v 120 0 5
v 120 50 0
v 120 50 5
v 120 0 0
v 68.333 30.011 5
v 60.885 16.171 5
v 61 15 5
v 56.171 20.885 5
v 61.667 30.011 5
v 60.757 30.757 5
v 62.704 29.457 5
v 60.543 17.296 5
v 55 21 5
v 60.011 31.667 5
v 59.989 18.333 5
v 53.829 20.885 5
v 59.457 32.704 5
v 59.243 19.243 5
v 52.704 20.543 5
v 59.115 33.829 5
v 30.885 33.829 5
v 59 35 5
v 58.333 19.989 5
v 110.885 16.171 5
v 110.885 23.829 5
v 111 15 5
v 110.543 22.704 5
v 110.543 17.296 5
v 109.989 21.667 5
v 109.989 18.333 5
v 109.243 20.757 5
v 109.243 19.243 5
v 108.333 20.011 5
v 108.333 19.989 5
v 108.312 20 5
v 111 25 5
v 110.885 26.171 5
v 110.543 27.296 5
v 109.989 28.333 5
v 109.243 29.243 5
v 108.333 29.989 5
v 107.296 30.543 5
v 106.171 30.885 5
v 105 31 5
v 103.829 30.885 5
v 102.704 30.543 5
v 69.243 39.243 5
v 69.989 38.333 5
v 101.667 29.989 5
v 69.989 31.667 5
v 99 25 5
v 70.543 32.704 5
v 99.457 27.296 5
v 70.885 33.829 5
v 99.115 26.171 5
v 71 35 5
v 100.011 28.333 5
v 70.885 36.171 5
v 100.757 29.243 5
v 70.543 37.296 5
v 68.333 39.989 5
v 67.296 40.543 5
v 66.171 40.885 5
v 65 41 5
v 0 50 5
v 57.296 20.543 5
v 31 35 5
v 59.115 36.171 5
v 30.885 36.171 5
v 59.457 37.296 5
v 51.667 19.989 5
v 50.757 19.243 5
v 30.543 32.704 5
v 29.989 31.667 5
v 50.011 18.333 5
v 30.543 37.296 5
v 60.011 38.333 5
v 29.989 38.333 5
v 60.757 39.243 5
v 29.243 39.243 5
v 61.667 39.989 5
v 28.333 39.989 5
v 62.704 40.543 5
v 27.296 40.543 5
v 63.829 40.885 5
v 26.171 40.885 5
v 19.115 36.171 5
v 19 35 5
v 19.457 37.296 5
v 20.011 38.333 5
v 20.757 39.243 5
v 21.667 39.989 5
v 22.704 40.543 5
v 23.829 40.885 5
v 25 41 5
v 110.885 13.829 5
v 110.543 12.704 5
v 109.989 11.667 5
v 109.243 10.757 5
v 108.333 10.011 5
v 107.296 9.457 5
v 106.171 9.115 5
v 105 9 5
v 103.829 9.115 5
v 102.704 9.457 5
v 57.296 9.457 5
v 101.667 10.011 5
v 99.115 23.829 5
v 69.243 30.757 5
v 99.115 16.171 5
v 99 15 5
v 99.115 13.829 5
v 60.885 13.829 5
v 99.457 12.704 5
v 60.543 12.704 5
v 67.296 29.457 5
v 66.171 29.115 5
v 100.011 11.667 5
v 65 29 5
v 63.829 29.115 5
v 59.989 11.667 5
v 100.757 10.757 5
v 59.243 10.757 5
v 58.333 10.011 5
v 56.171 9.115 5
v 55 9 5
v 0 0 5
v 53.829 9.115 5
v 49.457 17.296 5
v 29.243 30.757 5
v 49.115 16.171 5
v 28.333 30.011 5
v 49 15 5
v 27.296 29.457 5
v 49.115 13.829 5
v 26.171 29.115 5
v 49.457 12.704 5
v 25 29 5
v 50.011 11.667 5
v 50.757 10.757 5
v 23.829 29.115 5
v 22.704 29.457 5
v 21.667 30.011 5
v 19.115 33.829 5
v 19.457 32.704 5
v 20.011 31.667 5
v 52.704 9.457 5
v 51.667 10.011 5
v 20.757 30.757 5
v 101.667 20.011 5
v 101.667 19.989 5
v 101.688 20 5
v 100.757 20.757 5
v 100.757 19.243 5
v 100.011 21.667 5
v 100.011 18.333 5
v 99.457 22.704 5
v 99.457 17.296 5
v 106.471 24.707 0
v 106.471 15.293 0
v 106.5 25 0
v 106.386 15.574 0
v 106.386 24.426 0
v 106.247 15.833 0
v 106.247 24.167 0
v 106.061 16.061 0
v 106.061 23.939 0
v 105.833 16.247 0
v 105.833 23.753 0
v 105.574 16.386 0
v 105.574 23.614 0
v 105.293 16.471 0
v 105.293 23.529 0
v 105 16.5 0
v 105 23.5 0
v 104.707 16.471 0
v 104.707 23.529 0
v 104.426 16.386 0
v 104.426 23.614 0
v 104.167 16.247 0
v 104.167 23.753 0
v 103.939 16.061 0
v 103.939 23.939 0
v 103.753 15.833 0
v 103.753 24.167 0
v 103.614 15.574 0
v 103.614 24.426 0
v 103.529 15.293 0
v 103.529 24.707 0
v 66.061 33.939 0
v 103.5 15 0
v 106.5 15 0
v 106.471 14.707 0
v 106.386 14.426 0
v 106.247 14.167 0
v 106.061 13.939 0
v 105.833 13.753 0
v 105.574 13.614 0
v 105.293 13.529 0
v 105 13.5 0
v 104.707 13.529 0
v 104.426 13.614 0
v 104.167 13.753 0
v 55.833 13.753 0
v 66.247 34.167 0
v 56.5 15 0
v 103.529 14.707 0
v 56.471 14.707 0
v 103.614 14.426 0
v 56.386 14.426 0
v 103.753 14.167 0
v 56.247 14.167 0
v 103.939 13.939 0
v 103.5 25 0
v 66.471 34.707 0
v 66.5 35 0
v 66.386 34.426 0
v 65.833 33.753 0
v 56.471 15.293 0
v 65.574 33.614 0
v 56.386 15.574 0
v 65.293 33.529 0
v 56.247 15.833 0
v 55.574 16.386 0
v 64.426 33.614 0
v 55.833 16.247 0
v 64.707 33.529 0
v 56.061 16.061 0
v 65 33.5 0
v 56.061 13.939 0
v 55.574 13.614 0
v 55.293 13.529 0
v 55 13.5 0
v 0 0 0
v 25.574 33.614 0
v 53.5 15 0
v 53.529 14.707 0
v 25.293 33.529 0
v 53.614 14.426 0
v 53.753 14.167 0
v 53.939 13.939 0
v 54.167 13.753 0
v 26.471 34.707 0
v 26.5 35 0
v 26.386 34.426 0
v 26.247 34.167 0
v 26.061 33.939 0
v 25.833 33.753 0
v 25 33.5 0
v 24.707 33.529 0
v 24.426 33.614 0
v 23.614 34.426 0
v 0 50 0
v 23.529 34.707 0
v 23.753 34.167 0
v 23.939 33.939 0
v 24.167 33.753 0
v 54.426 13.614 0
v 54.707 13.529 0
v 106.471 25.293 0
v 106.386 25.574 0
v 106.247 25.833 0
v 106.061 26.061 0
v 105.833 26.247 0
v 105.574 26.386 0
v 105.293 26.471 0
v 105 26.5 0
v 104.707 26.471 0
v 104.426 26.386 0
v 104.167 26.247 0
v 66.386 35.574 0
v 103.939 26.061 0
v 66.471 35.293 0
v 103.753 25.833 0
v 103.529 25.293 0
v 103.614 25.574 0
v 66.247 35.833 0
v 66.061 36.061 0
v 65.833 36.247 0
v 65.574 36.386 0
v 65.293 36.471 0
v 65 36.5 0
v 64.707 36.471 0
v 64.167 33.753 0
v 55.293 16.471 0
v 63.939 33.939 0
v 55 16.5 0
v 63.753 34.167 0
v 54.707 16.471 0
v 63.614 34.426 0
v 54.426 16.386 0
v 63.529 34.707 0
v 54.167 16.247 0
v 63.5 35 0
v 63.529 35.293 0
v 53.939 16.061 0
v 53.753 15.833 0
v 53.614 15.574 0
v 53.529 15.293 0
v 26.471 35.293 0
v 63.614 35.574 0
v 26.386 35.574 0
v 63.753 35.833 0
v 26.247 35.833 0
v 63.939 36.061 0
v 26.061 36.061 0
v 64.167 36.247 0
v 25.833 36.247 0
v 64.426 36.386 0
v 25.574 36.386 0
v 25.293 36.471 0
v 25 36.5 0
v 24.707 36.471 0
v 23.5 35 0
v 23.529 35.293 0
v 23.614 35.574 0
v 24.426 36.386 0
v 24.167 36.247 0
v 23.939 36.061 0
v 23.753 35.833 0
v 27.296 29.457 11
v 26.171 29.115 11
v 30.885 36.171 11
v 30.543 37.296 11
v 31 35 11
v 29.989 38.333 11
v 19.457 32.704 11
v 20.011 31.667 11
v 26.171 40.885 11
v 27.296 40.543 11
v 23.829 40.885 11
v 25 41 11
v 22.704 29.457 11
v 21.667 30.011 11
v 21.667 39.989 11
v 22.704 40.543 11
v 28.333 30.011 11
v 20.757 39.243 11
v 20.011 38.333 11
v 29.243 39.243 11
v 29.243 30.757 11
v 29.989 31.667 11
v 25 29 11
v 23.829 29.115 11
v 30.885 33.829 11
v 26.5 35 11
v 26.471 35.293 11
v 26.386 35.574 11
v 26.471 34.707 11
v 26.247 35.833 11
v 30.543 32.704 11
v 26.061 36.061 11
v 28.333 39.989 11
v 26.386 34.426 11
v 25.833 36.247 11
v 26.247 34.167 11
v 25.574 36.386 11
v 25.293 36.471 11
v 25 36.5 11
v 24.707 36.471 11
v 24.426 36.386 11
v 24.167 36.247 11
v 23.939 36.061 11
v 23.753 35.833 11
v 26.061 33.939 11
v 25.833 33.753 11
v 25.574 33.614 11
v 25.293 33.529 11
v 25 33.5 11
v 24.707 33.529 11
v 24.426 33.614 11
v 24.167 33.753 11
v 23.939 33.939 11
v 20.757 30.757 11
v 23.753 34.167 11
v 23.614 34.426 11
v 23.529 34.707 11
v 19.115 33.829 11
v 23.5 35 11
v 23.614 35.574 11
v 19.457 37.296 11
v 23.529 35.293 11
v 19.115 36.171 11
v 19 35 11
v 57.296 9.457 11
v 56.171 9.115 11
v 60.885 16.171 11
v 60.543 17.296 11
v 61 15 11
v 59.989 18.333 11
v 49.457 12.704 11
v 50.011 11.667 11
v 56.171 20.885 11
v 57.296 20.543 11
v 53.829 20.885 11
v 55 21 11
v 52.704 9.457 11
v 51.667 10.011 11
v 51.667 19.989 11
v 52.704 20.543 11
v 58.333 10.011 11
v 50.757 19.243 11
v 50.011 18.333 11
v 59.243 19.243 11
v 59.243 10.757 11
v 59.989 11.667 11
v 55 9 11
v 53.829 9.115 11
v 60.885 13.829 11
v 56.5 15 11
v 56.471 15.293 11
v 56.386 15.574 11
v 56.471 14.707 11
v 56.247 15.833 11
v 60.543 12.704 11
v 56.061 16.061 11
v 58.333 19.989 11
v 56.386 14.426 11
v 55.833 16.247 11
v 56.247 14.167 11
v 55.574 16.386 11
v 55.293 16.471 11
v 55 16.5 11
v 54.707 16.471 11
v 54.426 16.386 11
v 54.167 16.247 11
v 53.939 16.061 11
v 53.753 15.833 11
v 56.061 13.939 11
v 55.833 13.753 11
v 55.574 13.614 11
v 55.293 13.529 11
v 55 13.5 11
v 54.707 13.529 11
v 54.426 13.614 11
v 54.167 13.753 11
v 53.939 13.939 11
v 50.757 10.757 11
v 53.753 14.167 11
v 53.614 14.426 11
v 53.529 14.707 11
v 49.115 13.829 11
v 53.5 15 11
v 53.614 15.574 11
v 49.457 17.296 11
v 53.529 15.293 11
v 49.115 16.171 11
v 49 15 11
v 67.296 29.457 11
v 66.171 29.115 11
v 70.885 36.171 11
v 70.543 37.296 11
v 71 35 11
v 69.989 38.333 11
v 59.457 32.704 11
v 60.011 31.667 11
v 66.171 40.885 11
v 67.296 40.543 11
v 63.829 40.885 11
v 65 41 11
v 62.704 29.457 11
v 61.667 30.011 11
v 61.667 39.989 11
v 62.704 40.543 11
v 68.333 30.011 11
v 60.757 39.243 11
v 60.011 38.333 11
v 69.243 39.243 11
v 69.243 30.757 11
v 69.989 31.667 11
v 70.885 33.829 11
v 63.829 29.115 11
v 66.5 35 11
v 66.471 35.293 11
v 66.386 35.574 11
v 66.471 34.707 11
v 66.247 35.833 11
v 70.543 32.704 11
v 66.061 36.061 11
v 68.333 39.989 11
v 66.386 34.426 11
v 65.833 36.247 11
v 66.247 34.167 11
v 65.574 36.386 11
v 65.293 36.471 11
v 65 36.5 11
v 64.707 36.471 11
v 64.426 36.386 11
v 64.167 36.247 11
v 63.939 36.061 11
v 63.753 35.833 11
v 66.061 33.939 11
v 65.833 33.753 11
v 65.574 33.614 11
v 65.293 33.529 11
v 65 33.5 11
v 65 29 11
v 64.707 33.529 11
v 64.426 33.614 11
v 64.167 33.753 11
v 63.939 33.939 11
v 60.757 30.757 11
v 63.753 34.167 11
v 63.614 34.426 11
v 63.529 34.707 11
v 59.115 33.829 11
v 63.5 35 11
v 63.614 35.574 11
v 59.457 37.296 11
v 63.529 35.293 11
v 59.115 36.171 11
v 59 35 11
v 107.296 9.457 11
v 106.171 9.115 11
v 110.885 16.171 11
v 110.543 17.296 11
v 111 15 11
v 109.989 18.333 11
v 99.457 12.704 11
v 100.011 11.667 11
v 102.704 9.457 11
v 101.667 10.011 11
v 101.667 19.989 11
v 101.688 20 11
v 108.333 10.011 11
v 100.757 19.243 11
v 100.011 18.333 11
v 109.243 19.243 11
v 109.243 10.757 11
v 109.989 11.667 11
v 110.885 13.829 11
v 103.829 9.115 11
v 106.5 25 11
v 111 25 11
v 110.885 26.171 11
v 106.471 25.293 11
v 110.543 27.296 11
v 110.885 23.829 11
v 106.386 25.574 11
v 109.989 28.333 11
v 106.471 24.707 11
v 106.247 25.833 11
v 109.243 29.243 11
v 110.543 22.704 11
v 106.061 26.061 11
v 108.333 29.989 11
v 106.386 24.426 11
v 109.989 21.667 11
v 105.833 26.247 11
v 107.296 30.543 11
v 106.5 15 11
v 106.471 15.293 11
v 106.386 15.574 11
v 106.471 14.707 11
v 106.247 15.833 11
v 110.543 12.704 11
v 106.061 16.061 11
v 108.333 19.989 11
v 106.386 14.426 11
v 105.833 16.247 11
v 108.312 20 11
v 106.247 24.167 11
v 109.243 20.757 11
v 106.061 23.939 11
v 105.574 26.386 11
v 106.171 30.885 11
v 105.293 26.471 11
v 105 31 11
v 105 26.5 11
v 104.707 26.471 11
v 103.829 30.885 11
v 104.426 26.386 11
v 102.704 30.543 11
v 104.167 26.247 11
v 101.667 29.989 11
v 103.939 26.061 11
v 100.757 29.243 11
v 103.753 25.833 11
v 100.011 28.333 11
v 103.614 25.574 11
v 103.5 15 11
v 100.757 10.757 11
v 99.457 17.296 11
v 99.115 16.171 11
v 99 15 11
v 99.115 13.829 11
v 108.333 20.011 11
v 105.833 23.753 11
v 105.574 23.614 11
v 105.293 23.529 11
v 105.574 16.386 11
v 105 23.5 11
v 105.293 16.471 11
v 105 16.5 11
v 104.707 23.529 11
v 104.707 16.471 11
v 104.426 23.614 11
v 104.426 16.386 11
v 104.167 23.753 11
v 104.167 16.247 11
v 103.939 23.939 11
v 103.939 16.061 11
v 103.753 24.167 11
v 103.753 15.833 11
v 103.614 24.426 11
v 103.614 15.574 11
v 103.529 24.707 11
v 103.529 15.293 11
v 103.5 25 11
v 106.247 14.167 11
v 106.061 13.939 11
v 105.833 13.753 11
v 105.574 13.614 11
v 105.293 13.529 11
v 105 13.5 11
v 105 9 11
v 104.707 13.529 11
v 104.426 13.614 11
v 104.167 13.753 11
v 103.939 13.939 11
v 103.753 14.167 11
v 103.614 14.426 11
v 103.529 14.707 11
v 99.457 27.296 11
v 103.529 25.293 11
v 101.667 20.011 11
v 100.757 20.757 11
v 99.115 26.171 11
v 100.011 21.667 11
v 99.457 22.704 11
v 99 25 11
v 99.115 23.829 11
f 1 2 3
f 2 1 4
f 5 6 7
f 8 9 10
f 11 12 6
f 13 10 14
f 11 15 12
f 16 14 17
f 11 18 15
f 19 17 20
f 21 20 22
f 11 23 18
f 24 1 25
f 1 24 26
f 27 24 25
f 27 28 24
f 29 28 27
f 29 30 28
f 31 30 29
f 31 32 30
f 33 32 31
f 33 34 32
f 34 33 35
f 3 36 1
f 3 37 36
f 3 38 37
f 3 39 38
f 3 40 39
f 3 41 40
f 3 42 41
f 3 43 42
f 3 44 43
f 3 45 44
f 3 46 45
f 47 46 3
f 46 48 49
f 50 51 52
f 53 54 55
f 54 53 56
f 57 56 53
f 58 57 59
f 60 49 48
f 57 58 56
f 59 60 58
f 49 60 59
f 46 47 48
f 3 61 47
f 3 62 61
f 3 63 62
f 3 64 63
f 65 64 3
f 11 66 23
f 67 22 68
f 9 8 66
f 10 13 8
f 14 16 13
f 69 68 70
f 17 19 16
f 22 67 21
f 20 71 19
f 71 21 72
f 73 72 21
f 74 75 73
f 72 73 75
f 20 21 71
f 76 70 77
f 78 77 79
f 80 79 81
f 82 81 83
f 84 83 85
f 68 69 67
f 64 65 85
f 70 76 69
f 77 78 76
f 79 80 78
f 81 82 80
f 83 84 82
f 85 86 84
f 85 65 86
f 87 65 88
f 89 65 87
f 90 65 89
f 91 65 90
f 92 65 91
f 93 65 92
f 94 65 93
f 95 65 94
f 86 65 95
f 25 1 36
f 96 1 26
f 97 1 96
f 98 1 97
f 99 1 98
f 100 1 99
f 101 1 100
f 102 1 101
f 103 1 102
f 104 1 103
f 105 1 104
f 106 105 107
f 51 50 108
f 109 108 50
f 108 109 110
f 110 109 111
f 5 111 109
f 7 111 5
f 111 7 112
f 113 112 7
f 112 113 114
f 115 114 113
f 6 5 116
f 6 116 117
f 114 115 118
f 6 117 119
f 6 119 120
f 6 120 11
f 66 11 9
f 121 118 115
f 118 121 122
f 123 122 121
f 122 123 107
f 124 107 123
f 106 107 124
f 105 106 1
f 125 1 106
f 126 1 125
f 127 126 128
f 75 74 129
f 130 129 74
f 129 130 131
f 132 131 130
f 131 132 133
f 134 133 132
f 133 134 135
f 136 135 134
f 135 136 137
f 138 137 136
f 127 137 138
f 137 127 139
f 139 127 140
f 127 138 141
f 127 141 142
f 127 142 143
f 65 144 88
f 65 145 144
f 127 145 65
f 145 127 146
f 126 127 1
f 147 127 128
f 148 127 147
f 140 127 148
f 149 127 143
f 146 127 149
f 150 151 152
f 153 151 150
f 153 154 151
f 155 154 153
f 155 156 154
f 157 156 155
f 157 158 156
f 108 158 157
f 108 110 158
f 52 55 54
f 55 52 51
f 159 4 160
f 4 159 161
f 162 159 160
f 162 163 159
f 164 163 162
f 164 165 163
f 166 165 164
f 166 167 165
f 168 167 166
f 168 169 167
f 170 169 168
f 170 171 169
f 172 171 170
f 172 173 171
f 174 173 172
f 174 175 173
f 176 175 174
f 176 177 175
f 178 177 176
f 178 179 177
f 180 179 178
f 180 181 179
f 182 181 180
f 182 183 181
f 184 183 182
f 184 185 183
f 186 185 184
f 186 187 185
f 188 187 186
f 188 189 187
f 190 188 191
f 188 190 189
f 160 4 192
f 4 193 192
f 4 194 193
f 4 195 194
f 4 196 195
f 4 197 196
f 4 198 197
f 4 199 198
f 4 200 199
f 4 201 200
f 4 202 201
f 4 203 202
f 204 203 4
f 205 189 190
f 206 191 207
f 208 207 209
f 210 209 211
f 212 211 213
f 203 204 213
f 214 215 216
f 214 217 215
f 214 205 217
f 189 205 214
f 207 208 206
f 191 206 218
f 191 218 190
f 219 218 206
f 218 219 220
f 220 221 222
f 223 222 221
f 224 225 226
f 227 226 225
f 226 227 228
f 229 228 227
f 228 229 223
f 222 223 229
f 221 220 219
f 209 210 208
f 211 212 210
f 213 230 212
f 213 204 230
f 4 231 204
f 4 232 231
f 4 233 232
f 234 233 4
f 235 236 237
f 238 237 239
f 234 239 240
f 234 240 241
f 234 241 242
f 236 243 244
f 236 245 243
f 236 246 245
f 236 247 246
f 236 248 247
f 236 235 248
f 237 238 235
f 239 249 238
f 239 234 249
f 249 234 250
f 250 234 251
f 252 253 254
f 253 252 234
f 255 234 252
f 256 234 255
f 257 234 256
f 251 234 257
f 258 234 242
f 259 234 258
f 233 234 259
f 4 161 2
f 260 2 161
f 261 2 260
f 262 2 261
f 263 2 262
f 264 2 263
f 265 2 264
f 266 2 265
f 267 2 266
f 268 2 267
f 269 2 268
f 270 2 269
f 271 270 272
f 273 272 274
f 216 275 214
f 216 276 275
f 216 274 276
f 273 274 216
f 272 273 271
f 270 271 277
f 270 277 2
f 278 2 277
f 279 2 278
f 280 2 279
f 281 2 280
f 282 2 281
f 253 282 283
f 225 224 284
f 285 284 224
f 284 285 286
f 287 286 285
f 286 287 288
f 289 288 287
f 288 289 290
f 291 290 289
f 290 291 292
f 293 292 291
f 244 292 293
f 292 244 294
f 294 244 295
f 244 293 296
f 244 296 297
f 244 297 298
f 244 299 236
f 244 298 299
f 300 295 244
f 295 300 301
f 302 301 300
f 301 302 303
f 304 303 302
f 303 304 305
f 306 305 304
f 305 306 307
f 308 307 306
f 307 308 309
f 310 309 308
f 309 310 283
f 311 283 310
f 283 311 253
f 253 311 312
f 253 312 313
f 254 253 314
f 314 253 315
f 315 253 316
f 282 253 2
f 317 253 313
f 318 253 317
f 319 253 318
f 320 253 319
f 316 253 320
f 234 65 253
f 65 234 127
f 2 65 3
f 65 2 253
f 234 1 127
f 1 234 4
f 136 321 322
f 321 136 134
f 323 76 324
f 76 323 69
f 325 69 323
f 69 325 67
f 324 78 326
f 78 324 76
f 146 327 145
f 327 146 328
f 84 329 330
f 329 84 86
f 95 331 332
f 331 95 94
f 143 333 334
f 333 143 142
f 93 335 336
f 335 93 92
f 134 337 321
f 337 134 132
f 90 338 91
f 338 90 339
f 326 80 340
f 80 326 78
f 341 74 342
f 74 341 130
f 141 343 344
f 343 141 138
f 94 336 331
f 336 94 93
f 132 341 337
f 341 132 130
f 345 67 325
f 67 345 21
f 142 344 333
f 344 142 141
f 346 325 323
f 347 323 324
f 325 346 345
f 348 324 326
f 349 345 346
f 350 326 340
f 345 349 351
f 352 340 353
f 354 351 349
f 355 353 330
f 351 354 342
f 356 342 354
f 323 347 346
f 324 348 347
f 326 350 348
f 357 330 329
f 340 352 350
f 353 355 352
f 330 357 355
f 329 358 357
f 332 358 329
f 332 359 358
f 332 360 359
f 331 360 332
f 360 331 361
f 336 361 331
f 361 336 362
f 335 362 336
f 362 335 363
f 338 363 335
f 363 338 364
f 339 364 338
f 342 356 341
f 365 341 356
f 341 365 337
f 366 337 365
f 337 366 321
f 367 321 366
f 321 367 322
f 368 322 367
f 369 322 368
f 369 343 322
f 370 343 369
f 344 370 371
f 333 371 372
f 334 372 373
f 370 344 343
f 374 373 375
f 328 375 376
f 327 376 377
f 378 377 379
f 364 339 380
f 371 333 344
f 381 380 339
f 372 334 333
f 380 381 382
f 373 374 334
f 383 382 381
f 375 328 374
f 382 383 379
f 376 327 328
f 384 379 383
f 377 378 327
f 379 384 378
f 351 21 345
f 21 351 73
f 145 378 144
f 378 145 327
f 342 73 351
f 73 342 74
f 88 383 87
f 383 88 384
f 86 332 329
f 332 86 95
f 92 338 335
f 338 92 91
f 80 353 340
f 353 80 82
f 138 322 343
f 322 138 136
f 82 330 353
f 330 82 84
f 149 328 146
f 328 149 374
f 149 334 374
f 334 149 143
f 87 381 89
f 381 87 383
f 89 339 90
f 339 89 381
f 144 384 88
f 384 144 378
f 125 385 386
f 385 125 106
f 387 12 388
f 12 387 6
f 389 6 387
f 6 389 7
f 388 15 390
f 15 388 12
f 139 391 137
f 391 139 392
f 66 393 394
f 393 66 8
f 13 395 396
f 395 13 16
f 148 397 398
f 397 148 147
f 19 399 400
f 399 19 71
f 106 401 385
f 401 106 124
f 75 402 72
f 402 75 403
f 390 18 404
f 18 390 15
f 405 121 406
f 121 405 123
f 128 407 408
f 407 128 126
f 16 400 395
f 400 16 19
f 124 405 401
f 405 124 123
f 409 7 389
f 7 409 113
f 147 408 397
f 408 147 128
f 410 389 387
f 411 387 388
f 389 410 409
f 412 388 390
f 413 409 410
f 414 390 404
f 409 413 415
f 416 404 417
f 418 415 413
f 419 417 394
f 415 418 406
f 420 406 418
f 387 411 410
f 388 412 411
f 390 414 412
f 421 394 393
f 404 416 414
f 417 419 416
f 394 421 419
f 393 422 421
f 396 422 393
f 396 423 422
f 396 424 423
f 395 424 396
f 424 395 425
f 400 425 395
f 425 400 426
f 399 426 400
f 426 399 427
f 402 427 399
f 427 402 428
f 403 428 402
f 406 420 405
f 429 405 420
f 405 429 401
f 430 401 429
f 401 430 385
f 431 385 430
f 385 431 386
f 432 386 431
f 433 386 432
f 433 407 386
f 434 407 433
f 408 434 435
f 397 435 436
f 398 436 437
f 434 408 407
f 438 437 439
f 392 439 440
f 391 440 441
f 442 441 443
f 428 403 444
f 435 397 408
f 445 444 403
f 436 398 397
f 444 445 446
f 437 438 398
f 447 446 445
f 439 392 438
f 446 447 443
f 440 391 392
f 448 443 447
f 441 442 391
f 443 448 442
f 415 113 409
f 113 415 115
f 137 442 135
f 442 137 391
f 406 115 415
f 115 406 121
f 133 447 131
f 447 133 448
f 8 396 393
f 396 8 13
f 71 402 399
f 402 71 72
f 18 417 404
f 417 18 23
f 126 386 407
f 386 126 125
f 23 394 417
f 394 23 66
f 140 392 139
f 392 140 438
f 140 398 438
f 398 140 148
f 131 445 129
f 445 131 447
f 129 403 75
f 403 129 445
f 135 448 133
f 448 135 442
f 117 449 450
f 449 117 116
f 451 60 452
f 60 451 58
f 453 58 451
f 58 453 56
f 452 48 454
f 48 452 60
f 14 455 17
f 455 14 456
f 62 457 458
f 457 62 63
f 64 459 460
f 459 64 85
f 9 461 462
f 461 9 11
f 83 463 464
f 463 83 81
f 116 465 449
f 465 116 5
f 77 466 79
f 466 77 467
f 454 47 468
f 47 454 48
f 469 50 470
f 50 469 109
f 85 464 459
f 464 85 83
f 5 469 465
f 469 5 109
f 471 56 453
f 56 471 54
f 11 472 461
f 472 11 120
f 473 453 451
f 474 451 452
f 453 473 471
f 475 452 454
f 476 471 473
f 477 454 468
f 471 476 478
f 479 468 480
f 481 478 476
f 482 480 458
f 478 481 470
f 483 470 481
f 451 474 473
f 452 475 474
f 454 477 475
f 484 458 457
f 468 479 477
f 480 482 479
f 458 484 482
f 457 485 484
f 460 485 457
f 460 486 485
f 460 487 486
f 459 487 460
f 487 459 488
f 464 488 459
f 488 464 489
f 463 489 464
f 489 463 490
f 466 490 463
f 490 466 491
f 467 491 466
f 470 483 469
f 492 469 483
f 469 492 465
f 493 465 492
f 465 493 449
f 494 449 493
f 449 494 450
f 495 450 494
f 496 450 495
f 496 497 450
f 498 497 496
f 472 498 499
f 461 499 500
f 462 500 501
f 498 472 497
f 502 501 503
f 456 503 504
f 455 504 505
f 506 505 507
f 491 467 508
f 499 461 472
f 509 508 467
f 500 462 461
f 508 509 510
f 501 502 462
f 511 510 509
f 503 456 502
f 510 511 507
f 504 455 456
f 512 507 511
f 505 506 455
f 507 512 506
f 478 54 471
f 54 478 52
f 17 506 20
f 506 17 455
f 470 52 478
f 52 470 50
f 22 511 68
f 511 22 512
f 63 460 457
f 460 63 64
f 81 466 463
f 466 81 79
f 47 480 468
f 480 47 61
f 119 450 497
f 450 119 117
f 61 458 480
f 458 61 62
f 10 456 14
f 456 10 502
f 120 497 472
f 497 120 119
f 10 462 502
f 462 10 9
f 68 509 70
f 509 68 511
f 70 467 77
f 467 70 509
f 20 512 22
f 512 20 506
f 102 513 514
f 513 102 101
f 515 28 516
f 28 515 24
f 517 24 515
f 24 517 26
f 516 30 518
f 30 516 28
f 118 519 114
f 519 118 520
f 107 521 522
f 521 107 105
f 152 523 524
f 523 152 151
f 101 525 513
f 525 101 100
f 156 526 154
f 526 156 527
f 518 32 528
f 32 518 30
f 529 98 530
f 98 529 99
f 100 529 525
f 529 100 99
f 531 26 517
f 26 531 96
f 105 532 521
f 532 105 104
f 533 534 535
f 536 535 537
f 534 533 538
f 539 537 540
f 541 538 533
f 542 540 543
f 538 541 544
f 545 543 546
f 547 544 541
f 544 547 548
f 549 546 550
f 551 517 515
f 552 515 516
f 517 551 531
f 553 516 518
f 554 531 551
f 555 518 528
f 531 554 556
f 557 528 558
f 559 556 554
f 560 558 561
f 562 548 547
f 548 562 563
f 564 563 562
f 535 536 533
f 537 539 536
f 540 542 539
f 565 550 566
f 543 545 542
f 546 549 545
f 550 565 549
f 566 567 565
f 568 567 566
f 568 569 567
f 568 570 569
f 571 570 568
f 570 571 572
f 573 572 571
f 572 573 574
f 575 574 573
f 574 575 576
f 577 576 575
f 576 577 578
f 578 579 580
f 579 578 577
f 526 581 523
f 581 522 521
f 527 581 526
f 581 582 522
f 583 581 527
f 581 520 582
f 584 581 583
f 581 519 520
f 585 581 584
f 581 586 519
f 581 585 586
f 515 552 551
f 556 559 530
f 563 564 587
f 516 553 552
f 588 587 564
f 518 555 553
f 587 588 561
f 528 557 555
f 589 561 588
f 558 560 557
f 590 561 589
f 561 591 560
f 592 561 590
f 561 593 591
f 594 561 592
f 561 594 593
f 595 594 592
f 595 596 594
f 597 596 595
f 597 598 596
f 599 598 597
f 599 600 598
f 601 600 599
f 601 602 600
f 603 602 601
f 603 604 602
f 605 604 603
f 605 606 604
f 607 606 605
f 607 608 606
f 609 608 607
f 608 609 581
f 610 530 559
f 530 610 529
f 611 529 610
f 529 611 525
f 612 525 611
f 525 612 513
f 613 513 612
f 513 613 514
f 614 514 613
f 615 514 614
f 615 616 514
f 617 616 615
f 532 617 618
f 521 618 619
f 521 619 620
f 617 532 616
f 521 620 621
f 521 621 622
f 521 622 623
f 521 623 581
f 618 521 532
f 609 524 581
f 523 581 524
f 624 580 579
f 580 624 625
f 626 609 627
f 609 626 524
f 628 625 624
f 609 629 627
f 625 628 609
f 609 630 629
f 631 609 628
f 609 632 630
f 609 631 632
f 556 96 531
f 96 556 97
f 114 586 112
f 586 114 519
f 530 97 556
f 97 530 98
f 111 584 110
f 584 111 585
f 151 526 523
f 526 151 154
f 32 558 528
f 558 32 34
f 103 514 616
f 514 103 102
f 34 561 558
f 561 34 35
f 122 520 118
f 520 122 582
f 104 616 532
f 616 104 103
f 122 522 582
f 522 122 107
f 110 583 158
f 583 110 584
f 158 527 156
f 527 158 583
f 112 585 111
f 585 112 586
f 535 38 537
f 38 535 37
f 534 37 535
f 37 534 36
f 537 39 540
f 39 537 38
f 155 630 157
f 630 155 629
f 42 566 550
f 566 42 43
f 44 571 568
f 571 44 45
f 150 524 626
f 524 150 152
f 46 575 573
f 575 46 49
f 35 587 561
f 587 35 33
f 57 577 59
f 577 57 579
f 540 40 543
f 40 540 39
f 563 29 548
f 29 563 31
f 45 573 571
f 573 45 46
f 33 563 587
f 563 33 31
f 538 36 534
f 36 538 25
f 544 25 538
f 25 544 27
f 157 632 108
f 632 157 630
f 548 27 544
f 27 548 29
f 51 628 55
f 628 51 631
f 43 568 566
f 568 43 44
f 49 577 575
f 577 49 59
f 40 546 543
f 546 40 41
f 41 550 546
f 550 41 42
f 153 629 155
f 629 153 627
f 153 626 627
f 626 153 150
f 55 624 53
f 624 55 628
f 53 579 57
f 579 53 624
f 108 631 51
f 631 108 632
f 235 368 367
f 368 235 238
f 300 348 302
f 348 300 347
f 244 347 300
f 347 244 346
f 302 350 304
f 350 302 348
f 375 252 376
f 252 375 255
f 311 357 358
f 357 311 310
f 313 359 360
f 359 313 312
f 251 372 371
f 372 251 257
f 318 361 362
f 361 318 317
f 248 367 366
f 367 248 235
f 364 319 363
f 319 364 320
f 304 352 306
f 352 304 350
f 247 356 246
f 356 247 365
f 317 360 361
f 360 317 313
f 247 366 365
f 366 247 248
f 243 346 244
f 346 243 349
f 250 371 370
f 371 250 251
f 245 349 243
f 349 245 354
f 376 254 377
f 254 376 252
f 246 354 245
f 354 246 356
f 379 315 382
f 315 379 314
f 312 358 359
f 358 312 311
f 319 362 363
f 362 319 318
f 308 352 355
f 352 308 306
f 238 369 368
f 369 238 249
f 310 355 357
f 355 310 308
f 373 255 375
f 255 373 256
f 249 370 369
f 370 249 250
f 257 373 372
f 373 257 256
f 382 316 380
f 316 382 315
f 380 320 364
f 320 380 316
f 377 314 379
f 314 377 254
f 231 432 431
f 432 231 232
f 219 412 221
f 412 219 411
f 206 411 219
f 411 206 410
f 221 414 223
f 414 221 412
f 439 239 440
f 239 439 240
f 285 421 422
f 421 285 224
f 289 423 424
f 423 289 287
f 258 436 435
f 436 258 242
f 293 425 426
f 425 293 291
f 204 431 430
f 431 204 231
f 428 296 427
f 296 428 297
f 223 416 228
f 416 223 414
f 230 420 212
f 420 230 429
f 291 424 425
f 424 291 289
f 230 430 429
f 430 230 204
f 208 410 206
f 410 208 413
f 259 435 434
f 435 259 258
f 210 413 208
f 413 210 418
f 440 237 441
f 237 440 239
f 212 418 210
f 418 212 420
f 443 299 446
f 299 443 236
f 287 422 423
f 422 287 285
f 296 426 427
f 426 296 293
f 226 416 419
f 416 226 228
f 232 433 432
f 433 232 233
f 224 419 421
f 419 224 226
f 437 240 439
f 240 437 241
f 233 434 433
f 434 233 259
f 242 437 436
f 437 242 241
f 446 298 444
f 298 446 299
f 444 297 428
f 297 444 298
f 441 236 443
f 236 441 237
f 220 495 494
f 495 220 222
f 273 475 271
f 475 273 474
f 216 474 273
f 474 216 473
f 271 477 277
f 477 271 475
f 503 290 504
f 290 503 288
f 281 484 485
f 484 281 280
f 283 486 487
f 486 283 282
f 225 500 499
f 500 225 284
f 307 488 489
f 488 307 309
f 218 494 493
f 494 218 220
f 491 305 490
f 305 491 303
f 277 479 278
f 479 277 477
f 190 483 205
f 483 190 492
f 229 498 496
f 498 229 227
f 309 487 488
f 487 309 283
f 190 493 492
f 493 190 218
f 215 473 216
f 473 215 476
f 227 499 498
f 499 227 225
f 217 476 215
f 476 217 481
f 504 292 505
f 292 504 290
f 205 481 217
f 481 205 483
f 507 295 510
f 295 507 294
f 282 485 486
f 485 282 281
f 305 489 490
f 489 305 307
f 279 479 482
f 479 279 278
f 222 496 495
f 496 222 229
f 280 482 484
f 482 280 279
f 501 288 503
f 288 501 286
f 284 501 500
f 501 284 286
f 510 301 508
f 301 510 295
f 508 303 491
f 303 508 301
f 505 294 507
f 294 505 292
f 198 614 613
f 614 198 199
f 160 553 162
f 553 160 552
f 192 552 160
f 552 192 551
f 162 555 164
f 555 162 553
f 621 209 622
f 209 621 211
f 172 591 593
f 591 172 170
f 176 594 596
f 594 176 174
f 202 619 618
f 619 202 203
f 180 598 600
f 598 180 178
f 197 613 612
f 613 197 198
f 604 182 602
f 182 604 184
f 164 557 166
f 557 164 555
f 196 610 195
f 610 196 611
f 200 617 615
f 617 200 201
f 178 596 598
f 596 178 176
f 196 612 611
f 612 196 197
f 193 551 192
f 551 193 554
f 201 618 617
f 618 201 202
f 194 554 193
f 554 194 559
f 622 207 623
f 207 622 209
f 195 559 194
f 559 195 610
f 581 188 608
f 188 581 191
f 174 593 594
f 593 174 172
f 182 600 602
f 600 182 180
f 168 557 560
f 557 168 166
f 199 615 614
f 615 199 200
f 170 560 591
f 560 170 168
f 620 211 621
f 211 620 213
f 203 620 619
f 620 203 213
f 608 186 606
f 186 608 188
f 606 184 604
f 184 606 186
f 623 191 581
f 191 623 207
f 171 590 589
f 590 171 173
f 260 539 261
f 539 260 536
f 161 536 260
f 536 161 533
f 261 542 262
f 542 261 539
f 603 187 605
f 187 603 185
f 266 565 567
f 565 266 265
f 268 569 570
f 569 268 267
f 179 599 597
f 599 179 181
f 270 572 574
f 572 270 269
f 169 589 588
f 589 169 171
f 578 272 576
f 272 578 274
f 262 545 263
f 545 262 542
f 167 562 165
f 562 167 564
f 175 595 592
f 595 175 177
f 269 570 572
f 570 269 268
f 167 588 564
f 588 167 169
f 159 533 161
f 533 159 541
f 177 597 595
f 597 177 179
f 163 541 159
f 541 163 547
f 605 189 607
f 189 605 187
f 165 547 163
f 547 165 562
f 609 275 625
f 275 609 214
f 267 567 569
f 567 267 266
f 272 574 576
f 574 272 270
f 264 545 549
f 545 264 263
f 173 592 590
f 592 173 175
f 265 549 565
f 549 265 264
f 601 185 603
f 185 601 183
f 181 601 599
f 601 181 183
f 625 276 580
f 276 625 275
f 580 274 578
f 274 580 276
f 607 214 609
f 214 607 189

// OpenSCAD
$fn = 32;

// ----------------------------------------------------------------------
// Boss field: plate with bosses at given coordinates
// ----------------------------------------------------------------------

// --- parameters (mm) ---
plate_l = 120;            // plate length, X
plate_w = 50;             // plate width, Y
plate_t = 5;              // plate thickness, Z
boss_d = 12;              // boss diameter
boss_h = 6;               // boss height above the plate
bore_d = 3;               // boss bore

total_h = plate_t + boss_h;  // overall height

difference() {
  union() {
    cube([plate_l, plate_w, plate_t]);
    translate([25, 35, plate_t]) cylinder(h = boss_h, d = boss_d);
    translate([55, 15, plate_t]) cylinder(h = boss_h, d = boss_d);
    translate([65, 35, plate_t]) cylinder(h = boss_h, d = boss_d);
    translate([105, 15, plate_t]) cylinder(h = boss_h, d = boss_d);
    translate([105, 25, plate_t]) cylinder(h = boss_h, d = boss_d);
  }
  translate([25, 35, -1]) cylinder(h = total_h + 2, d = bore_d);
  translate([55, 15, -1]) cylinder(h = total_h + 2, d = bore_d);
  translate([65, 35, -1]) cylinder(h = total_h + 2, d = bore_d);
  translate([105, 15, -1]) cylinder(h = total_h + 2, d = bore_d);
  translate([105, 25, -1]) cylinder(h = total_h + 2, d = bore_d);
}
